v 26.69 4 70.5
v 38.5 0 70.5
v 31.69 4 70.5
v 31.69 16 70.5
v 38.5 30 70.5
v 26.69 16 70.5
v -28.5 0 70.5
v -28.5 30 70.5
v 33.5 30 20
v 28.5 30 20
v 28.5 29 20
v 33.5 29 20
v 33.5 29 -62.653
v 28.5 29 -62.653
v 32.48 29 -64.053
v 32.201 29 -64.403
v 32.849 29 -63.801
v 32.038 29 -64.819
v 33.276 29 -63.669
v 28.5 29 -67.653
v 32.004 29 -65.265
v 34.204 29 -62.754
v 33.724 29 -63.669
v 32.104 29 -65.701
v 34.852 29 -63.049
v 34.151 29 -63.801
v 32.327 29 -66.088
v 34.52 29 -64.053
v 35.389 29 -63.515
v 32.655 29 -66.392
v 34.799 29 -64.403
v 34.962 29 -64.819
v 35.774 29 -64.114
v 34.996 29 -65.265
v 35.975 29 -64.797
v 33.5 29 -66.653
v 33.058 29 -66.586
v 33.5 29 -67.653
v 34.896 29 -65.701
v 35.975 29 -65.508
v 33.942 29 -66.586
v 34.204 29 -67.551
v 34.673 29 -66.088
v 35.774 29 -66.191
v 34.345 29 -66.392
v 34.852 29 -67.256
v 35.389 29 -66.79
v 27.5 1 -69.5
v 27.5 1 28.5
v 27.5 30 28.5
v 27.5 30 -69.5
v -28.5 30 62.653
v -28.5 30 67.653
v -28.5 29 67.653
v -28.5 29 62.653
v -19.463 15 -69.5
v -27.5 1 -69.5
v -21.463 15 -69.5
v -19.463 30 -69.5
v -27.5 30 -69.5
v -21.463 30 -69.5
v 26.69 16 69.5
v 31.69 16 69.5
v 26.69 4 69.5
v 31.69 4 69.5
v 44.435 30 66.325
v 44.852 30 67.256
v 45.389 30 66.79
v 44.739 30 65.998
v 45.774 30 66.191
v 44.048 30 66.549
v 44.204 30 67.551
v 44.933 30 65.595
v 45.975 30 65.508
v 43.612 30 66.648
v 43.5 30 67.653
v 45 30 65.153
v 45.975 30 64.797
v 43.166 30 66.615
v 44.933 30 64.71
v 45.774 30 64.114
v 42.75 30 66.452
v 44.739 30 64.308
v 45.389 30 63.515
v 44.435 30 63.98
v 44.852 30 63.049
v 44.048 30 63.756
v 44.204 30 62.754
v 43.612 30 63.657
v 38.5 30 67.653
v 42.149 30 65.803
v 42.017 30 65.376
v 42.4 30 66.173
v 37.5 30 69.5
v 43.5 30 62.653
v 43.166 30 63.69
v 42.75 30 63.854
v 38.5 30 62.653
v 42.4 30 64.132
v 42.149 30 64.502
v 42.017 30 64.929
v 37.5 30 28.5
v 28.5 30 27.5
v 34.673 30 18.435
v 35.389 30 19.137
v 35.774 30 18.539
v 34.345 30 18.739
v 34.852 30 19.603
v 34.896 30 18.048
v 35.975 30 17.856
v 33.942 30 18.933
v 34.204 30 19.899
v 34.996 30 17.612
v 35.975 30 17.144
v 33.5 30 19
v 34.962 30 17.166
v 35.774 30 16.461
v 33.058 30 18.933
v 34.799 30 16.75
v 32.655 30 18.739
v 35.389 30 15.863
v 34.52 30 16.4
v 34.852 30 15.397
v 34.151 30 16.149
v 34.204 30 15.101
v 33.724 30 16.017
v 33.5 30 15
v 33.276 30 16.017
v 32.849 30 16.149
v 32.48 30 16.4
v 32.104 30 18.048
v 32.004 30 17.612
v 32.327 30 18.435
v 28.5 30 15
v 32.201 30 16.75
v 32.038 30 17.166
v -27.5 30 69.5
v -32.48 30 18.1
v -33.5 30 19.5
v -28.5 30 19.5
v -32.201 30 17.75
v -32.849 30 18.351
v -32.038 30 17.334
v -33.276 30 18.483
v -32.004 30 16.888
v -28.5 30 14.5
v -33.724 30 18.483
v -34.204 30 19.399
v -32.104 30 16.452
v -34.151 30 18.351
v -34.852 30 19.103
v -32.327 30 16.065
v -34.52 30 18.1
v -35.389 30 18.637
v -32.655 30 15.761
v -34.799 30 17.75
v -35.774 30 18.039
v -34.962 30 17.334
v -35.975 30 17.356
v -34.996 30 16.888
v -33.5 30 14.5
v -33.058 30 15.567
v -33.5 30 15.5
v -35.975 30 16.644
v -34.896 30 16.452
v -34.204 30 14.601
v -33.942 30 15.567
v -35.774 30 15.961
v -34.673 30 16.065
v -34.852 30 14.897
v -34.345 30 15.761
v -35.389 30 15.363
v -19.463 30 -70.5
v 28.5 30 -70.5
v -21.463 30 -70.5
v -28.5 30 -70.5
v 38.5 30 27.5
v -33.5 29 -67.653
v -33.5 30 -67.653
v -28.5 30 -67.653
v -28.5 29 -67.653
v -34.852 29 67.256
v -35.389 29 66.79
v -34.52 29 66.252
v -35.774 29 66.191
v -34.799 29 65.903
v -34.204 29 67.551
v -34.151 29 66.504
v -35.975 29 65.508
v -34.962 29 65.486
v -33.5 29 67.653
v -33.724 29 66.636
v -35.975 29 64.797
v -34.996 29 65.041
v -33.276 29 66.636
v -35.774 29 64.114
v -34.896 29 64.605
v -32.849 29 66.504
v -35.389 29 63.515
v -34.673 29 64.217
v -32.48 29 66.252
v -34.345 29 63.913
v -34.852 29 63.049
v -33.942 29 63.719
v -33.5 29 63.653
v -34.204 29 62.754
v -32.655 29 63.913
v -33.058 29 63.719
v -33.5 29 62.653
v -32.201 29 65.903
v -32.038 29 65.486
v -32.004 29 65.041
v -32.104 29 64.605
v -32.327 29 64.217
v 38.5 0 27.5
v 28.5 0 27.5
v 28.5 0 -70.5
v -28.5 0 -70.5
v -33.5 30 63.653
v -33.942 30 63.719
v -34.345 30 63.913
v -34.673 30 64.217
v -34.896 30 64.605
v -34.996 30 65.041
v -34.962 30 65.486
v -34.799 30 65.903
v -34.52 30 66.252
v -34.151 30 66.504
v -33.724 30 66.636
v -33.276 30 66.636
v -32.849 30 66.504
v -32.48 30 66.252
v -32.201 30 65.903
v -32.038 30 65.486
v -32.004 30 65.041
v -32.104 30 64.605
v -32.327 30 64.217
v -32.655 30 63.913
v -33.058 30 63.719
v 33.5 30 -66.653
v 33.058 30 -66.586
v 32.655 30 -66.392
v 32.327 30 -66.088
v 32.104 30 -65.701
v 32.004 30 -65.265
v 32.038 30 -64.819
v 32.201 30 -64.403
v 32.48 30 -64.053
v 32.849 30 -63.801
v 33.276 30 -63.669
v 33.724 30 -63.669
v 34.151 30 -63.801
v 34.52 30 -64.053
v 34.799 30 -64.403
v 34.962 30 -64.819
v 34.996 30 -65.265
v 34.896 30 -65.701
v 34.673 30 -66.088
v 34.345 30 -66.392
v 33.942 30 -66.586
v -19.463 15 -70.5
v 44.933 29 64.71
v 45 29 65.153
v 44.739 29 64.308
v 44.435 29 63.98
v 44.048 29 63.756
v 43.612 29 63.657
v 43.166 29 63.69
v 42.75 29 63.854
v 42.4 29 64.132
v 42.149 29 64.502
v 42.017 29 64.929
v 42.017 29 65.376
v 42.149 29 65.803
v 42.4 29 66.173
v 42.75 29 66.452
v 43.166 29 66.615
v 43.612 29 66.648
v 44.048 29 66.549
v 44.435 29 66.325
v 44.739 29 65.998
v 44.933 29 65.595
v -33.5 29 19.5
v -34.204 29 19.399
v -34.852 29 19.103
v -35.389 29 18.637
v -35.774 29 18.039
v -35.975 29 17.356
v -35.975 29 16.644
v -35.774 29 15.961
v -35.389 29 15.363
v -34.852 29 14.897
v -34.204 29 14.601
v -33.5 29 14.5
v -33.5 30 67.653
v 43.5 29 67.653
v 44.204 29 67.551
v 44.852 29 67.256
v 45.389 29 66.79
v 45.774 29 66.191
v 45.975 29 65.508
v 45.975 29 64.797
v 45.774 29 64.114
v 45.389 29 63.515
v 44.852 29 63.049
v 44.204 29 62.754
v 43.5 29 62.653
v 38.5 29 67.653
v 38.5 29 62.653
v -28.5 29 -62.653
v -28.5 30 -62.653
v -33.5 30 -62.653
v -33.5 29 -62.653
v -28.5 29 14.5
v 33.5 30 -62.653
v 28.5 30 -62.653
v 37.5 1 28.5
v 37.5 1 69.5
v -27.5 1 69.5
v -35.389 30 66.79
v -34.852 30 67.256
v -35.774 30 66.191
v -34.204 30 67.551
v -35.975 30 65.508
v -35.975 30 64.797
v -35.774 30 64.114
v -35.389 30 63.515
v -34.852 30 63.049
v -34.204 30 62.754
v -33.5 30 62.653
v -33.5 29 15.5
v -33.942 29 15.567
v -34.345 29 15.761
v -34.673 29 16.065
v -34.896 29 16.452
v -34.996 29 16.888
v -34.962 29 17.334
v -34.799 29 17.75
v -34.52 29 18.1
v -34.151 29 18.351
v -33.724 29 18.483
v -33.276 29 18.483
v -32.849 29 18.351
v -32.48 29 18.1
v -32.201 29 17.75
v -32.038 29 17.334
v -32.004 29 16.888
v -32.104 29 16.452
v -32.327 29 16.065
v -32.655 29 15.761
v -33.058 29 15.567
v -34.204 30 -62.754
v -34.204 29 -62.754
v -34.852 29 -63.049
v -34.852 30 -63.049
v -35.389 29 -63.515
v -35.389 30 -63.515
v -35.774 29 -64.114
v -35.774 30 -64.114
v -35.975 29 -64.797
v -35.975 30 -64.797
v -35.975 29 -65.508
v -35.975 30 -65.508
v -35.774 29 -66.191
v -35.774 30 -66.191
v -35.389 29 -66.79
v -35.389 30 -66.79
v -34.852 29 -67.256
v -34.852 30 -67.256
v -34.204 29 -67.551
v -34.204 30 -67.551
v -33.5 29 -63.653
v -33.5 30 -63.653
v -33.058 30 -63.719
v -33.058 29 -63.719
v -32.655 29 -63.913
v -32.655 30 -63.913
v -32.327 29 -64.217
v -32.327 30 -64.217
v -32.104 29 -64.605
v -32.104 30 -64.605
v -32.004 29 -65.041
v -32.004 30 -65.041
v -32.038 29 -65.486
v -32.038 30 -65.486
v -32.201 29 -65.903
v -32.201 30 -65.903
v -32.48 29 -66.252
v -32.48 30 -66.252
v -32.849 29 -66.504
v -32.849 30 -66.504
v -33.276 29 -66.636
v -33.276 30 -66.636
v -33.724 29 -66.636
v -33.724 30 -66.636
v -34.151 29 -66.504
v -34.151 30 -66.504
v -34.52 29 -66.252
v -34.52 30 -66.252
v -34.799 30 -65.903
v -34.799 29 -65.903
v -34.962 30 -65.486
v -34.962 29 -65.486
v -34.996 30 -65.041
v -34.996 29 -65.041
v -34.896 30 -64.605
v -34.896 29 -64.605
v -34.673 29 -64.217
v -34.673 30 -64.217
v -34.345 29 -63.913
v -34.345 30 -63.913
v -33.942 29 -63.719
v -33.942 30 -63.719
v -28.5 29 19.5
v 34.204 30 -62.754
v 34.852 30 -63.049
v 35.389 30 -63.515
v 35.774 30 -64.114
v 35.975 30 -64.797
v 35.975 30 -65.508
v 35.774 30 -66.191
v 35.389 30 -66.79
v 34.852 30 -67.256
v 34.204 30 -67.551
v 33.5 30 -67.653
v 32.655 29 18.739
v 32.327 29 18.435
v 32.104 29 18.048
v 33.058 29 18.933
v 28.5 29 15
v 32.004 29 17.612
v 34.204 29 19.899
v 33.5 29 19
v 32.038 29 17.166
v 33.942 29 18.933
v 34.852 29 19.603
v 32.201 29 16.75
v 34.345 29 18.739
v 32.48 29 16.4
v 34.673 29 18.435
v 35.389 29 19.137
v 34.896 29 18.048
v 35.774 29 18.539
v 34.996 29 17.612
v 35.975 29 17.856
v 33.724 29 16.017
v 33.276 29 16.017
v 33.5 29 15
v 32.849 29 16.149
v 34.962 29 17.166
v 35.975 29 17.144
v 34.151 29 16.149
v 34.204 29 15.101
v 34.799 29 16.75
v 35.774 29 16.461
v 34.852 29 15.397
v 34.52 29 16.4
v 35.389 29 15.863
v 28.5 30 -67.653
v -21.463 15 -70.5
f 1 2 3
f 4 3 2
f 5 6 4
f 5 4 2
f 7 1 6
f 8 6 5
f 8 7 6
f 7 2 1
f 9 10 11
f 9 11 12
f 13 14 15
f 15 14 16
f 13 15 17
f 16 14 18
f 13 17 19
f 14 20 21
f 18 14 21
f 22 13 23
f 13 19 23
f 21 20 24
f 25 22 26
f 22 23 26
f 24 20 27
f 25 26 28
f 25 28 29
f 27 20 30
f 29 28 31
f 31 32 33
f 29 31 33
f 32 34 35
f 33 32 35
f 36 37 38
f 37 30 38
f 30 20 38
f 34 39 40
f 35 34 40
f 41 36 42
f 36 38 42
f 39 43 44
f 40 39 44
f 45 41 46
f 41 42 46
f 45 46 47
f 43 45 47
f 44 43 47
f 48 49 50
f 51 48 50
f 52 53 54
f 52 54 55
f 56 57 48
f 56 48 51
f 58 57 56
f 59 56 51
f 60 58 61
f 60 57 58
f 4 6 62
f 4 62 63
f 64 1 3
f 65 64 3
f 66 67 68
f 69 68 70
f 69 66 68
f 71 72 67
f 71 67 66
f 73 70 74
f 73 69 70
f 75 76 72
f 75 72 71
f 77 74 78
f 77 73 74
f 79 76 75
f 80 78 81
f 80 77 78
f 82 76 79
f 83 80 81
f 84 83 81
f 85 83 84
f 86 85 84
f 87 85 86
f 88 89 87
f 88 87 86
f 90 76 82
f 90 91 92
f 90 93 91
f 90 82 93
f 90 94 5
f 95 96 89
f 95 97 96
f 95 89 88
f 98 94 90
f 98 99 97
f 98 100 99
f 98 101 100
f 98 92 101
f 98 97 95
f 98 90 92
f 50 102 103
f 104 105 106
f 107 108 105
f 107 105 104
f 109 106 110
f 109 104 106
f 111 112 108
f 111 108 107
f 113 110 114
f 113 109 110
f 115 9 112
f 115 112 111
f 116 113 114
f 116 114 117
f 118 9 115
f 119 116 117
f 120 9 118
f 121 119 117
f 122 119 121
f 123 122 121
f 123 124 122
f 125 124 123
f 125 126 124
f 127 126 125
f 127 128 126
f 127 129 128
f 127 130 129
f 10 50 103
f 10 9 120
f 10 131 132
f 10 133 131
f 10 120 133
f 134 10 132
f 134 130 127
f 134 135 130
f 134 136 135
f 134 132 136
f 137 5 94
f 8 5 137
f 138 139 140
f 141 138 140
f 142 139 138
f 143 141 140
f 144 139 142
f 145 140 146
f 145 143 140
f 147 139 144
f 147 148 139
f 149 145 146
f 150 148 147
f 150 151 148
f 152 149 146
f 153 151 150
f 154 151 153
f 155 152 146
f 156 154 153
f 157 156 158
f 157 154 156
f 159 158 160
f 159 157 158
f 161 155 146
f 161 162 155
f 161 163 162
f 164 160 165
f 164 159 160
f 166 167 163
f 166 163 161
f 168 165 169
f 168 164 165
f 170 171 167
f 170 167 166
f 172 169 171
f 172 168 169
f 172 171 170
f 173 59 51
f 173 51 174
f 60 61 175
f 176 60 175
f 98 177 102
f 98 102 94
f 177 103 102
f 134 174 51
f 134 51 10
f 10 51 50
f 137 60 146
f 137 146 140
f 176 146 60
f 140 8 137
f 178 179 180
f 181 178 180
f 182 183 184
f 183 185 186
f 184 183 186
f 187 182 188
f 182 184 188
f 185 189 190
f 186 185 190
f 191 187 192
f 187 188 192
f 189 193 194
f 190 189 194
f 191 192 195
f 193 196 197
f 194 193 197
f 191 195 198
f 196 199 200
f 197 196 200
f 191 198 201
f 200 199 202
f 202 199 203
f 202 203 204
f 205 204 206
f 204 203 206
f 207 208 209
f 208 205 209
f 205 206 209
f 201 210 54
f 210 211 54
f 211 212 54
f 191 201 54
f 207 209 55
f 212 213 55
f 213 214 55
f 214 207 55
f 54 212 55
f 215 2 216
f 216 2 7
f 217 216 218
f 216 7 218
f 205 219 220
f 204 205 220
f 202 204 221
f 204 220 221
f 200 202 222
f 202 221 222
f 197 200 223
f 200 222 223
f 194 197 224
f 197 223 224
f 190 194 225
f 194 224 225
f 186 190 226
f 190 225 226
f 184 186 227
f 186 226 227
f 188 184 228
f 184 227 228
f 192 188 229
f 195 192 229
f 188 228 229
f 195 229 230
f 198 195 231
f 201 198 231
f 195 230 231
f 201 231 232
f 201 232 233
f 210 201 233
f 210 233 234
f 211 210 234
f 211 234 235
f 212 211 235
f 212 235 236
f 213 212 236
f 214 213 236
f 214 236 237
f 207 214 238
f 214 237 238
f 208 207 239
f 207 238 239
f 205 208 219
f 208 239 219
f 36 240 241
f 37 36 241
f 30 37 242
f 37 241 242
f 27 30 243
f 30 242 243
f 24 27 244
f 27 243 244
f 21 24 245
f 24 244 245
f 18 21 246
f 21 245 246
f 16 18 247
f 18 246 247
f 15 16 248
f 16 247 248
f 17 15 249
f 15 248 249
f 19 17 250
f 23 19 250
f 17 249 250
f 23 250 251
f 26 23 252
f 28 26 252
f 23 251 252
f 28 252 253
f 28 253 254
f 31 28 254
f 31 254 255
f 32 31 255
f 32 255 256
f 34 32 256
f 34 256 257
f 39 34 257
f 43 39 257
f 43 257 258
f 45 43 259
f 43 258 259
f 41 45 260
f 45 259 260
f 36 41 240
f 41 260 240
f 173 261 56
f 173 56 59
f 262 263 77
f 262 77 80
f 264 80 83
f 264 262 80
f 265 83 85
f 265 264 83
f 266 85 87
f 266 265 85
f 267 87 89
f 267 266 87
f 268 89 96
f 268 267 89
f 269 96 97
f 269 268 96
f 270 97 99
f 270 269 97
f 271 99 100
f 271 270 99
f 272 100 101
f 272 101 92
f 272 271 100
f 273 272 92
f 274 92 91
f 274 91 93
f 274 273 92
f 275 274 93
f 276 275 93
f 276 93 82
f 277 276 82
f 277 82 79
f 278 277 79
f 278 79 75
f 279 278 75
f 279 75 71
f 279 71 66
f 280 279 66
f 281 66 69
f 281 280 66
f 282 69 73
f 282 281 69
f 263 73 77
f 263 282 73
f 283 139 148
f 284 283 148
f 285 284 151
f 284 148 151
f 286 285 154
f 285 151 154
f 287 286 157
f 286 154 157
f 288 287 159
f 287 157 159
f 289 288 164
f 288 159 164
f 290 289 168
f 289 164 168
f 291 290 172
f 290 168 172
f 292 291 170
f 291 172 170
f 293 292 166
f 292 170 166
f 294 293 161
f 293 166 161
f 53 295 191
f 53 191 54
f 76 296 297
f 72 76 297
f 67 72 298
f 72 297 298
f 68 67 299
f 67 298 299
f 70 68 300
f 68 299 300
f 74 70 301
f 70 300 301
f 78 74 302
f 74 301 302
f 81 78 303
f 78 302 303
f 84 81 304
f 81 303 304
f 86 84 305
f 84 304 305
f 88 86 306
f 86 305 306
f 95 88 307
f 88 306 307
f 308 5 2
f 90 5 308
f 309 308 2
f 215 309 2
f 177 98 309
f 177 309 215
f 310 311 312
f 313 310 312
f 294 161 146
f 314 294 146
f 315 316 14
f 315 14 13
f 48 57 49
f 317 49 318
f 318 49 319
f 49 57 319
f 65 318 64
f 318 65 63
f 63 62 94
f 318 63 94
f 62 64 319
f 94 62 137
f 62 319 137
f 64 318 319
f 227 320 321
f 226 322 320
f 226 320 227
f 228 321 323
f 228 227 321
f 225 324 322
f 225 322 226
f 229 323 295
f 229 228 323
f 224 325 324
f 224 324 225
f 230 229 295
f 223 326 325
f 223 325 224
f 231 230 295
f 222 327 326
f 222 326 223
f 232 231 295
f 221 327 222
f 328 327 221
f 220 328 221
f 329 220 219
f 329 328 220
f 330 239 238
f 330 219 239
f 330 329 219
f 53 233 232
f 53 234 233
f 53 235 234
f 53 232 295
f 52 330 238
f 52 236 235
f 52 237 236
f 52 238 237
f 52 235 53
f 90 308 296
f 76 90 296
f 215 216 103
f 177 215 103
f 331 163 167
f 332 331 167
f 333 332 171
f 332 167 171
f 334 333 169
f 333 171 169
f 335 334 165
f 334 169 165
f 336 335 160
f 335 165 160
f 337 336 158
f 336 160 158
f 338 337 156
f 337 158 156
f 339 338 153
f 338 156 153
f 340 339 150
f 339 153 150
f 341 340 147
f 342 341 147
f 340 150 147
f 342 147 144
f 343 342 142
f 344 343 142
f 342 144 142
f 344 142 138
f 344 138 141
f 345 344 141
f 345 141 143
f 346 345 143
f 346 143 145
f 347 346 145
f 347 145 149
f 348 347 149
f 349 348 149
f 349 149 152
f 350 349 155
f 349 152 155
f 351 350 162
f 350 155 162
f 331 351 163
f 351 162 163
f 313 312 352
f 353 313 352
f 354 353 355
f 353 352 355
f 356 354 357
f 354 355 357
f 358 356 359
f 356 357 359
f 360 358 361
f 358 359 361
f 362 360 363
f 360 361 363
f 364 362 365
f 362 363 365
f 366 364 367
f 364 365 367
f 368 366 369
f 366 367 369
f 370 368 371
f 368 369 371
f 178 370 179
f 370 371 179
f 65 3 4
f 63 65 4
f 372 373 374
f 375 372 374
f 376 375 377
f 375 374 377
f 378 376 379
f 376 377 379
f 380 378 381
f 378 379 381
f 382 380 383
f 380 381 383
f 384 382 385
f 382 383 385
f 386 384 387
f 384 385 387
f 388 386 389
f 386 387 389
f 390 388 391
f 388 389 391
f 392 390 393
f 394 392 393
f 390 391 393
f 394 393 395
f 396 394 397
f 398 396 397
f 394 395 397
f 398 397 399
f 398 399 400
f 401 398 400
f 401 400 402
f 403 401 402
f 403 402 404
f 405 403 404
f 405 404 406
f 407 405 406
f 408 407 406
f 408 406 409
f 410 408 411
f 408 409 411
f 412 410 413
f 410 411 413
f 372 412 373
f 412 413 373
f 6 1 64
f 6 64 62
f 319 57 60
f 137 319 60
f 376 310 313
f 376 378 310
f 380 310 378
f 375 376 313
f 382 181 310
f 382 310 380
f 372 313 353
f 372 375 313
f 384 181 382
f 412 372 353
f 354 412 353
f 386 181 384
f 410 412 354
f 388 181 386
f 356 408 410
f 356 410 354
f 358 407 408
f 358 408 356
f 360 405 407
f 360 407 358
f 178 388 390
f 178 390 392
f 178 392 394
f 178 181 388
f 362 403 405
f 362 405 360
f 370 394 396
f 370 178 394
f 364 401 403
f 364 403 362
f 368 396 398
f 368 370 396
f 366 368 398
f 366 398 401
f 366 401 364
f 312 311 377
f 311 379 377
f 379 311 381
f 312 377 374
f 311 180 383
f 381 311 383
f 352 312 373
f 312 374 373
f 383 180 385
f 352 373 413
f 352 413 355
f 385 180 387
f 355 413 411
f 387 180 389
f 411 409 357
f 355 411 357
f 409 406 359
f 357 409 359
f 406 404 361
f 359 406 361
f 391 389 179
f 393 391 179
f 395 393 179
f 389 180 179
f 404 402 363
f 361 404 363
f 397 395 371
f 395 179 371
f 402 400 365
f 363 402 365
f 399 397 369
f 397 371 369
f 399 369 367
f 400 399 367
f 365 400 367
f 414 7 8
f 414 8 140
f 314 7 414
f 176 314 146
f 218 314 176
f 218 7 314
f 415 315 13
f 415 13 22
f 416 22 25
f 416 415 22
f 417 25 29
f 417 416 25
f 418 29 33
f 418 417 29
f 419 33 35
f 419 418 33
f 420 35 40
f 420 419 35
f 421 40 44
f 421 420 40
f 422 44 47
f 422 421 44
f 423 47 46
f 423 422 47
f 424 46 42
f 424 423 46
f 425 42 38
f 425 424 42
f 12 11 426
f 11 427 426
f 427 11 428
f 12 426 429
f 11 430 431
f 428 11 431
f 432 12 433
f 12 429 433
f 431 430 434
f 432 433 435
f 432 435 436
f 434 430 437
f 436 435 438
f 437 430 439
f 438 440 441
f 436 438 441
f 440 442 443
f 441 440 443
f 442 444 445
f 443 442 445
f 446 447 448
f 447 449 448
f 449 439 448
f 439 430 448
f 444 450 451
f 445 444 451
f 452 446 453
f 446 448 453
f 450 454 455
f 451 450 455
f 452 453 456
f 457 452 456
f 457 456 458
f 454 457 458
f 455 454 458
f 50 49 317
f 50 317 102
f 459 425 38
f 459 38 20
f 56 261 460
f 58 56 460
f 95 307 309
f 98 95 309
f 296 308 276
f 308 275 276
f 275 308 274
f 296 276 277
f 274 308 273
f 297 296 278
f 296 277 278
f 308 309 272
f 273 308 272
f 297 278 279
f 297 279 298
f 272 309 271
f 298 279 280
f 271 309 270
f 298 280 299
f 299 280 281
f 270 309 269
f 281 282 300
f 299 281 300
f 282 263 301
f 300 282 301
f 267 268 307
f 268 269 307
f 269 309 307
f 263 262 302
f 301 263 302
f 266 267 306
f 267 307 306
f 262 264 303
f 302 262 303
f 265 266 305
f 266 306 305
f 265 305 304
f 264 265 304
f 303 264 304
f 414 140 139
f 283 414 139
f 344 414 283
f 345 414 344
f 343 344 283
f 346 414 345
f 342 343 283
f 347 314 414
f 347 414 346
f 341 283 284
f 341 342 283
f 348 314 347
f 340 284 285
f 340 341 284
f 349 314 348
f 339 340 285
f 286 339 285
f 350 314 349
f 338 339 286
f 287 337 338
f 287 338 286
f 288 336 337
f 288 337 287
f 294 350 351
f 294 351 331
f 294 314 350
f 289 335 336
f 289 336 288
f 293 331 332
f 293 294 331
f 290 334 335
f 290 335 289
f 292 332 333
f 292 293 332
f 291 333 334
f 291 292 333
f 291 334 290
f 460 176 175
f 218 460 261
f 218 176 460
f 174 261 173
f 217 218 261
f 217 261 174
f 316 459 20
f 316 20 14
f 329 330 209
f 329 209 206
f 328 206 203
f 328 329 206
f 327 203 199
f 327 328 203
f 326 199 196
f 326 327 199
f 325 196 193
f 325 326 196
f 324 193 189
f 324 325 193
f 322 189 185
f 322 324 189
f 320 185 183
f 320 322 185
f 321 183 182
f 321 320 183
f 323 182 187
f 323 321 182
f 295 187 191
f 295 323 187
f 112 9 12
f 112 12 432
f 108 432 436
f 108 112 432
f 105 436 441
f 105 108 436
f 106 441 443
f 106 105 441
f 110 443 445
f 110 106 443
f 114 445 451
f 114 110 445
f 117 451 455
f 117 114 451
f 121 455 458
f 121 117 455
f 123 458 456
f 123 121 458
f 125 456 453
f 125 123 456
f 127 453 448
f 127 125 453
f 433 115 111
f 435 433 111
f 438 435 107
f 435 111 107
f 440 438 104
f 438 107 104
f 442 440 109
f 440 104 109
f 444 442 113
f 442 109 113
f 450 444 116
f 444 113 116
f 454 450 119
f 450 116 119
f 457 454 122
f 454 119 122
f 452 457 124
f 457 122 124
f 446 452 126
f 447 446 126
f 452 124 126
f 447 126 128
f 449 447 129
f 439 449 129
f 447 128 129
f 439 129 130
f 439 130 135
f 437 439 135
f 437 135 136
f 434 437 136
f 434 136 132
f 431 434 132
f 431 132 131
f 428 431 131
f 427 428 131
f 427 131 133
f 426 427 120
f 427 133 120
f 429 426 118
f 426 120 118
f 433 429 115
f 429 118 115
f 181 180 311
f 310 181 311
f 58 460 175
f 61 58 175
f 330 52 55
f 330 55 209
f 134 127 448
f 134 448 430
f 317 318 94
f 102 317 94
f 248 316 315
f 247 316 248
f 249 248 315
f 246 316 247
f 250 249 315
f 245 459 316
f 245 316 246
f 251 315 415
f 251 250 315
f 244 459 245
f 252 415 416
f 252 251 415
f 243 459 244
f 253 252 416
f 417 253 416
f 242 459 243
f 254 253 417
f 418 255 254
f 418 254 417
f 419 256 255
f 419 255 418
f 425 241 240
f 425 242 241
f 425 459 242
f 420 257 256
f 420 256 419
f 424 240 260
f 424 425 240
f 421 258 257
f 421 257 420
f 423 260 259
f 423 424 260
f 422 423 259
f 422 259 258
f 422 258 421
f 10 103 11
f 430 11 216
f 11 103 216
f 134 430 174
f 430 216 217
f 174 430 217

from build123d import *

# Parameters (mm, degrees)
SKETCH2_W             = 57
SKETCH2_H             = 141
BOSS_EXTRUDE1_DEPTH   = 30
SKETCH3_R             = 1.5
BOSS_EXTRUDE3_DEPTH   = 1
BOSS_EXTRUDE3_2_DEPTH = 1
BOSS_EXTRUDE3_3_DEPTH = 1
SKETCH4_W             = 43
SKETCH4_H             = 30
BOSS_EXTRUDE4_DEPTH   = 10
MIRROR1_START         = 29
MIRROR1_OUTLINE_R     = 1.5
MIRROR1_DEPTH         = 1
SHELL3_START          = -27.5
SHELL3_OUTLINE_W      = 29
SHELL3_OUTLINE_H      = 139
SHELL3_DEPTH          = 55
SHELL3_START_2        = 27.5
SHELL3_2_OUTLINE_W    = 29
SHELL3_2_OUTLINE_H    = 41
SHELL3_2_DEPTH        = 10
SKETCH7_W             = 5
SKETCH7_H             = 12
CUT_EXTRUDE1_DEPTH    = 19
SKETCH8_W             = 2
SKETCH8_H             = 15
CUT_EXTRUDE2_DEPTH    = 19
SKETCH10_R            = 1.5
BOSS_EXTRUDE5_DEPTH   = 1
SKETCH11_R            = 1.5
BOSS_EXTRUDE6_DEPTH   = 1


# Read off the part's stored shape, not the designer's step: Mirror1, Shell3
with BuildPart() as part:
    # Sketch2 → Boss-Extrude1 (new body)
    with BuildSketch(Plane(origin=(0, 0, 0), x_dir=(1, 0, 0), z_dir=(0, 1, 0))):
        Rectangle(SKETCH2_W, SKETCH2_H)
    extrude(amount=BOSS_EXTRUDE1_DEPTH)

    # Sketch4 → Boss-Extrude4 (add)
    with BuildSketch(Plane(origin=(28.5, 0, 0), x_dir=(0, 0, -1), z_dir=(1, 0, 0))):
        with Locations((-49, 15)):
            Rectangle(SKETCH4_W, SKETCH4_H)
    extrude(amount=BOSS_EXTRUDE4_DEPTH)

    # Mirror1 outline → Mirror1 (add)
    with BuildSketch(Plane(origin=(0, 0, 0), x_dir=(1, 0, 0), z_dir=(0, 1, 0)).offset(MIRROR1_START)):
        with BuildLine():
            ThreePointArc((43.5, -67.652604127), (46, -65.152604127), (43.5, -62.652604127))
            Line((43.5, -62.652604127), (38.5, -62.652604127))
            Line((38.5, -62.652604127), (38.5, -67.652604127))
            Line((38.5, -67.652604127), (43.5, -67.652604127))
        make_face()
        with Locations((43.5, -65.152604127)):
            Circle(MIRROR1_OUTLINE_R, mode=Mode.SUBTRACT)
    extrude(amount=MIRROR1_DEPTH)

    # Shell3 outline → Shell3 (cut)
    with BuildSketch(Plane.YZ.offset(SHELL3_START)):
        with Locations((15.5, 0)):
            Rectangle(SHELL3_OUTLINE_W, SHELL3_OUTLINE_H)
    extrude(amount=SHELL3_DEPTH, mode=Mode.SUBTRACT)

    # Shell3 2 outline → Shell3 2 (cut)
    with BuildSketch(Plane.YZ.offset(SHELL3_START_2)):
        with Locations((15.5, 49)):
            Rectangle(SHELL3_2_OUTLINE_W, SHELL3_2_OUTLINE_H)
    extrude(amount=SHELL3_2_DEPTH, mode=Mode.SUBTRACT)

    # Sketch7 → Cut-Extrude1 (cut)
    with BuildSketch(Plane.XY.offset(70.5)):
        with Locations((29.189674396, 10)):
            Rectangle(SKETCH7_W, SKETCH7_H)
    extrude(amount=-CUT_EXTRUDE1_DEPTH, mode=Mode.SUBTRACT)

    # Sketch8 → Cut-Extrude2 (cut)
    with BuildSketch(Plane(origin=(0, 0, -70.5), x_dir=(-1, 0, 0), z_dir=(0, 0, -1))):
        with Locations((20.463026601, 22.5)):
            Rectangle(SKETCH8_W, SKETCH8_H)
    extrude(amount=-CUT_EXTRUDE2_DEPTH, mode=Mode.SUBTRACT)

    # Sketch10 → Boss-Extrude5 (add)
    with BuildSketch(Plane(origin=(0, 30, 0), x_dir=(1, 0, 0), z_dir=(0, 1, 0))):
        with BuildLine():
            Line((33.5, -15), (28.5, -15))
            Line((28.5, -15), (28.5, -20))
            Line((28.5, -20), (33.5, -20))
            ThreePointArc((33.5, -20), (36, -17.5), (33.5, -15))
        make_face()
        with Locations(Location((33.5, -17.5, 0), (0, 0, 270))):
            Circle(SKETCH10_R, mode=Mode.SUBTRACT)
    extrude(amount=-BOSS_EXTRUDE5_DEPTH)

    # Sketch11 → Boss-Extrude6 (add)
    with BuildSketch(Plane(origin=(0, 30, 0), x_dir=(1, 0, 0), z_dir=(0, 1, 0))):
        with BuildLine():
            Line((-28.5, -19.5), (-33.5, -19.5))
            ThreePointArc((-33.5, -19.5), (-36, -17), (-33.5, -14.5))
            Line((-33.5, -14.5), (-28.5, -14.5))
            Line((-28.5, -14.5), (-28.5, -19.5))
        make_face()
        with Locations(Location((-33.5, -17, 0), (0, 0, 90))):
            Circle(SKETCH11_R, mode=Mode.SUBTRACT)
    extrude(amount=-BOSS_EXTRUDE6_DEPTH)


with BuildPart() as body_2:
    # Sketch3 → Boss-Extrude3 (new body)
    with BuildSketch(Plane(origin=(0, 30, 0), x_dir=(1, 0, 0), z_dir=(0, 1, 0))):
        with BuildLine():
            Line((-33.5, 67.652604127), (-28.5, 67.652604127))
            Line((-28.5, 67.652604127), (-28.5, 62.652604127))
            Line((-28.5, 62.652604127), (-33.5, 62.652604127))
            ThreePointArc((-33.5, 62.652604127), (-36, 65.152604127), (-33.5, 67.652604127))
        make_face()
        with Locations(Location((-33.5, 65.152604127, 0), (0, 0, 270))):
            Circle(SKETCH3_R, mode=Mode.SUBTRACT)
    extrude(amount=-BOSS_EXTRUDE3_DEPTH)


with BuildPart() as body_3:
    # Sketch3 → Boss-Extrude3 2 (new body)
    with BuildSketch(Plane(origin=(0, 30, 0), x_dir=(1, 0, 0), z_dir=(0, 1, 0))):
        with BuildLine():
            Line((-28.5, -67.652604127), (-28.5, -62.652604127))
            Line((-28.5, -62.652604127), (-33.5, -62.652604127))
            ThreePointArc((-33.5, -62.652604127), (-36, -65.152604127), (-33.5, -67.652604127))
            Line((-33.5, -67.652604127), (-28.5, -67.652604127))
        make_face()
        with Locations(Location((-33.5, -65.152604127, 0), (0, 0, 90))):
            Circle(SKETCH3_R, mode=Mode.SUBTRACT)
    extrude(amount=-BOSS_EXTRUDE3_2_DEPTH)


with BuildPart() as body_4:
    # Sketch3 → Boss-Extrude3 3 (new body)
    with BuildSketch(Plane(origin=(0, 30, 0), x_dir=(1, 0, 0), z_dir=(0, 1, 0))):
        with BuildLine():
            Line((28.5, 67.652604127), (28.5, 62.652604127))
            Line((28.5, 62.652604127), (33.5, 62.652604127))
            ThreePointArc((33.5, 62.652604127), (36, 65.152604127), (33.5, 67.652604127))
            Line((33.5, 67.652604127), (28.5, 67.652604127))
        make_face()
        with Locations(Location((33.5, 65.152604127, 0), (0, 0, 90))):
            Circle(SKETCH3_R, mode=Mode.SUBTRACT)
    extrude(amount=-BOSS_EXTRUDE3_3_DEPTH)


solid = Compound([part.part, body_2.part, body_3.part, body_4.part])
